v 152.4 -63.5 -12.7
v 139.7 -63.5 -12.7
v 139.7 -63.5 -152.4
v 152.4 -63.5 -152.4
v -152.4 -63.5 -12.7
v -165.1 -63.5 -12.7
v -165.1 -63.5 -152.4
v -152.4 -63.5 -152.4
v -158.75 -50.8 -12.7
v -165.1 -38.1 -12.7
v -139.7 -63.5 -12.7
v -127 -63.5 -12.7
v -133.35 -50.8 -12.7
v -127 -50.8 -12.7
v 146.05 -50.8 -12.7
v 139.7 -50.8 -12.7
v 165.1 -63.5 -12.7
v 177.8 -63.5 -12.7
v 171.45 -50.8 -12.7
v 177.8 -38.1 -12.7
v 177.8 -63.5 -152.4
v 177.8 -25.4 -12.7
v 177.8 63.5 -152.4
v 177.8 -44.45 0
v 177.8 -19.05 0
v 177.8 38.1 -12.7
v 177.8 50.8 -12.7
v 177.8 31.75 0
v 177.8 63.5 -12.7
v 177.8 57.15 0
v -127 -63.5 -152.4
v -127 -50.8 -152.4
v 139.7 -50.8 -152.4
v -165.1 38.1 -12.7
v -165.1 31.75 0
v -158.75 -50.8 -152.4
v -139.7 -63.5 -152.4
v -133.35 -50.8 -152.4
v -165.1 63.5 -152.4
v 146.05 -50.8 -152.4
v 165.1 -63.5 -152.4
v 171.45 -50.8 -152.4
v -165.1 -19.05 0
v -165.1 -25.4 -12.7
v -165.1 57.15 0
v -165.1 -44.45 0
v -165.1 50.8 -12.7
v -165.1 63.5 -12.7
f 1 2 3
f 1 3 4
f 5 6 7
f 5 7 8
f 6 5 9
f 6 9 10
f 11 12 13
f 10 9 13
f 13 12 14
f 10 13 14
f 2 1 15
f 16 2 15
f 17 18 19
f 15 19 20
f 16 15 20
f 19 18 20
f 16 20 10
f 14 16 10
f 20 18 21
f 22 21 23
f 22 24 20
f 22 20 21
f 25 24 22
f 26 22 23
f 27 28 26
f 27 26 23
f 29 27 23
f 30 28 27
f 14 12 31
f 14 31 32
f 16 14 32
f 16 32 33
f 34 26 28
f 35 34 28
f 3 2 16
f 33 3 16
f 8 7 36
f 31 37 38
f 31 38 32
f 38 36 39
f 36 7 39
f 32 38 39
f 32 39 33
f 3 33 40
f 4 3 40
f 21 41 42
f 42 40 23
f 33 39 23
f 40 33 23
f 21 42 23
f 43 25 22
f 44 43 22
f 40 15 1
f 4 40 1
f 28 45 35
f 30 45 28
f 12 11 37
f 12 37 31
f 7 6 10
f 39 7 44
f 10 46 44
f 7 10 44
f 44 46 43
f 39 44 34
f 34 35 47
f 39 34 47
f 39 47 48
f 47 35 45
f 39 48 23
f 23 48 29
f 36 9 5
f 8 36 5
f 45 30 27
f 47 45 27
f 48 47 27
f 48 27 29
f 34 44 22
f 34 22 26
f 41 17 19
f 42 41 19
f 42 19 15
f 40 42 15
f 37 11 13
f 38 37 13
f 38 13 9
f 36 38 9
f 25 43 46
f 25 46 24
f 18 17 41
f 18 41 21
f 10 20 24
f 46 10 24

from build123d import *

# Parameters (mm, degrees)
F0_W     = 355.6
F0_H     = 127
F1_DEPTH = 152.4
F2_W     = 266.7
F2_H     = 12.7
F3_DEPTH = 152.4
F4_W     = 12.7
F4_H     = 12.7
F4_H_2   = 6.35
F4_H_3   = 38.1
F5_DEPTH = 152.4
F6_W     = 12.7
F6_H     = 12.7
F6_W_2   = 6.35
F6_W_3   = 38.1
F7_DEPTH = 342.9


with BuildPart() as f1:
    # F0 (on Top) → F1 (new body)
    with BuildSketch(Plane.XY):
        Rectangle(F0_W, F0_H)
    extrude(amount=-F1_DEPTH)

    # F2 (on face) → F3 (cut)
    with BuildSketch(Plane.XY):
        Polygon((152.4, -63.5), (165.1, -63.5), (171.45, -50.8), (146.05, -50.8), align=None)
        with Locations((6.35, -57.15)):
            Rectangle(F2_W, F2_H)
        Polygon((-139.7, -63.5), (-133.35, -50.8), (-158.75, -50.8), (-152.4, -63.5), align=None)
    extrude(amount=-F3_DEPTH, mode=Mode.SUBTRACT)

    # F4 (on face) → F5 (cut)
    with BuildSketch(Plane.XY):
        with Locations((-171.45, -57.15)):
            Rectangle(F4_W, F4_H)
        Polygon((-165.1, 57.15), (-177.8, 57.15), (-177.8, 50.8), align=None)
        with Locations((-171.45, 60.325)):
            Rectangle(F4_W, F4_H_2)
        Polygon((-177.8, 31.75), (-165.1, 31.75), (-177.8, 38.1), align=None)
        with Locations((-171.45, 28.575)):
            Rectangle(F4_W, F4_H_2)
        with Locations((-171.45, -15.875)):
            Rectangle(F4_W, F4_H_2)
        Polygon((-177.8, -25.4), (-165.1, -19.05), (-177.8, -19.05), align=None)
        Polygon((-177.8, -44.45), (-165.1, -44.45), (-177.8, -38.1), align=None)
        with Locations((-171.45, -47.625)):
            Rectangle(F4_W, F4_H_2)
        with Locations((-171.45, 6.35)):
            Rectangle(F4_W, F4_H_3)
        Polygon((-165.1, -44.45), (-165.1, -19.05), (-177.8, -25.4), (-177.8, -38.1), align=None)
        Polygon((-165.1, 31.75), (-165.1, 57.15), (-177.8, 50.8), (-177.8, 38.1), align=None)
    extrude(amount=-F5_DEPTH, mode=Mode.SUBTRACT)

    # F6 (on face) → F7 (cut)
    with BuildSketch(Plane.YZ.offset(177.8)):
        with Locations((-57.15, -6.35)):
            Rectangle(F6_W, F6_H)
        with Locations((-47.625, -6.35)):
            Rectangle(F6_W_2, F6_H)
        Polygon((-38.1, -12.7), (-44.45, 0), (-44.45, -12.7), align=None)
        Polygon((-19.05, -12.7), (-19.05, 0), (-25.4, -12.7), align=None)
        with Locations((-15.875, -6.35)):
            Rectangle(F6_W_2, F6_H)
        with Locations((6.35, -6.35)):
            Rectangle(F6_W_3, F6_H)
        with Locations((28.575, -6.35)):
            Rectangle(F6_W_2, F6_H)
        Polygon((38.1, -12.7), (31.75, 0), (31.75, -12.7), align=None)
        Polygon((57.15, -12.7), (57.15, 0), (50.8, -12.7), align=None)
        with Locations((60.325, -6.35)):
            Rectangle(F6_W_2, F6_H)
    extrude(amount=-F7_DEPTH, mode=Mode.SUBTRACT)


solid = f1.part
